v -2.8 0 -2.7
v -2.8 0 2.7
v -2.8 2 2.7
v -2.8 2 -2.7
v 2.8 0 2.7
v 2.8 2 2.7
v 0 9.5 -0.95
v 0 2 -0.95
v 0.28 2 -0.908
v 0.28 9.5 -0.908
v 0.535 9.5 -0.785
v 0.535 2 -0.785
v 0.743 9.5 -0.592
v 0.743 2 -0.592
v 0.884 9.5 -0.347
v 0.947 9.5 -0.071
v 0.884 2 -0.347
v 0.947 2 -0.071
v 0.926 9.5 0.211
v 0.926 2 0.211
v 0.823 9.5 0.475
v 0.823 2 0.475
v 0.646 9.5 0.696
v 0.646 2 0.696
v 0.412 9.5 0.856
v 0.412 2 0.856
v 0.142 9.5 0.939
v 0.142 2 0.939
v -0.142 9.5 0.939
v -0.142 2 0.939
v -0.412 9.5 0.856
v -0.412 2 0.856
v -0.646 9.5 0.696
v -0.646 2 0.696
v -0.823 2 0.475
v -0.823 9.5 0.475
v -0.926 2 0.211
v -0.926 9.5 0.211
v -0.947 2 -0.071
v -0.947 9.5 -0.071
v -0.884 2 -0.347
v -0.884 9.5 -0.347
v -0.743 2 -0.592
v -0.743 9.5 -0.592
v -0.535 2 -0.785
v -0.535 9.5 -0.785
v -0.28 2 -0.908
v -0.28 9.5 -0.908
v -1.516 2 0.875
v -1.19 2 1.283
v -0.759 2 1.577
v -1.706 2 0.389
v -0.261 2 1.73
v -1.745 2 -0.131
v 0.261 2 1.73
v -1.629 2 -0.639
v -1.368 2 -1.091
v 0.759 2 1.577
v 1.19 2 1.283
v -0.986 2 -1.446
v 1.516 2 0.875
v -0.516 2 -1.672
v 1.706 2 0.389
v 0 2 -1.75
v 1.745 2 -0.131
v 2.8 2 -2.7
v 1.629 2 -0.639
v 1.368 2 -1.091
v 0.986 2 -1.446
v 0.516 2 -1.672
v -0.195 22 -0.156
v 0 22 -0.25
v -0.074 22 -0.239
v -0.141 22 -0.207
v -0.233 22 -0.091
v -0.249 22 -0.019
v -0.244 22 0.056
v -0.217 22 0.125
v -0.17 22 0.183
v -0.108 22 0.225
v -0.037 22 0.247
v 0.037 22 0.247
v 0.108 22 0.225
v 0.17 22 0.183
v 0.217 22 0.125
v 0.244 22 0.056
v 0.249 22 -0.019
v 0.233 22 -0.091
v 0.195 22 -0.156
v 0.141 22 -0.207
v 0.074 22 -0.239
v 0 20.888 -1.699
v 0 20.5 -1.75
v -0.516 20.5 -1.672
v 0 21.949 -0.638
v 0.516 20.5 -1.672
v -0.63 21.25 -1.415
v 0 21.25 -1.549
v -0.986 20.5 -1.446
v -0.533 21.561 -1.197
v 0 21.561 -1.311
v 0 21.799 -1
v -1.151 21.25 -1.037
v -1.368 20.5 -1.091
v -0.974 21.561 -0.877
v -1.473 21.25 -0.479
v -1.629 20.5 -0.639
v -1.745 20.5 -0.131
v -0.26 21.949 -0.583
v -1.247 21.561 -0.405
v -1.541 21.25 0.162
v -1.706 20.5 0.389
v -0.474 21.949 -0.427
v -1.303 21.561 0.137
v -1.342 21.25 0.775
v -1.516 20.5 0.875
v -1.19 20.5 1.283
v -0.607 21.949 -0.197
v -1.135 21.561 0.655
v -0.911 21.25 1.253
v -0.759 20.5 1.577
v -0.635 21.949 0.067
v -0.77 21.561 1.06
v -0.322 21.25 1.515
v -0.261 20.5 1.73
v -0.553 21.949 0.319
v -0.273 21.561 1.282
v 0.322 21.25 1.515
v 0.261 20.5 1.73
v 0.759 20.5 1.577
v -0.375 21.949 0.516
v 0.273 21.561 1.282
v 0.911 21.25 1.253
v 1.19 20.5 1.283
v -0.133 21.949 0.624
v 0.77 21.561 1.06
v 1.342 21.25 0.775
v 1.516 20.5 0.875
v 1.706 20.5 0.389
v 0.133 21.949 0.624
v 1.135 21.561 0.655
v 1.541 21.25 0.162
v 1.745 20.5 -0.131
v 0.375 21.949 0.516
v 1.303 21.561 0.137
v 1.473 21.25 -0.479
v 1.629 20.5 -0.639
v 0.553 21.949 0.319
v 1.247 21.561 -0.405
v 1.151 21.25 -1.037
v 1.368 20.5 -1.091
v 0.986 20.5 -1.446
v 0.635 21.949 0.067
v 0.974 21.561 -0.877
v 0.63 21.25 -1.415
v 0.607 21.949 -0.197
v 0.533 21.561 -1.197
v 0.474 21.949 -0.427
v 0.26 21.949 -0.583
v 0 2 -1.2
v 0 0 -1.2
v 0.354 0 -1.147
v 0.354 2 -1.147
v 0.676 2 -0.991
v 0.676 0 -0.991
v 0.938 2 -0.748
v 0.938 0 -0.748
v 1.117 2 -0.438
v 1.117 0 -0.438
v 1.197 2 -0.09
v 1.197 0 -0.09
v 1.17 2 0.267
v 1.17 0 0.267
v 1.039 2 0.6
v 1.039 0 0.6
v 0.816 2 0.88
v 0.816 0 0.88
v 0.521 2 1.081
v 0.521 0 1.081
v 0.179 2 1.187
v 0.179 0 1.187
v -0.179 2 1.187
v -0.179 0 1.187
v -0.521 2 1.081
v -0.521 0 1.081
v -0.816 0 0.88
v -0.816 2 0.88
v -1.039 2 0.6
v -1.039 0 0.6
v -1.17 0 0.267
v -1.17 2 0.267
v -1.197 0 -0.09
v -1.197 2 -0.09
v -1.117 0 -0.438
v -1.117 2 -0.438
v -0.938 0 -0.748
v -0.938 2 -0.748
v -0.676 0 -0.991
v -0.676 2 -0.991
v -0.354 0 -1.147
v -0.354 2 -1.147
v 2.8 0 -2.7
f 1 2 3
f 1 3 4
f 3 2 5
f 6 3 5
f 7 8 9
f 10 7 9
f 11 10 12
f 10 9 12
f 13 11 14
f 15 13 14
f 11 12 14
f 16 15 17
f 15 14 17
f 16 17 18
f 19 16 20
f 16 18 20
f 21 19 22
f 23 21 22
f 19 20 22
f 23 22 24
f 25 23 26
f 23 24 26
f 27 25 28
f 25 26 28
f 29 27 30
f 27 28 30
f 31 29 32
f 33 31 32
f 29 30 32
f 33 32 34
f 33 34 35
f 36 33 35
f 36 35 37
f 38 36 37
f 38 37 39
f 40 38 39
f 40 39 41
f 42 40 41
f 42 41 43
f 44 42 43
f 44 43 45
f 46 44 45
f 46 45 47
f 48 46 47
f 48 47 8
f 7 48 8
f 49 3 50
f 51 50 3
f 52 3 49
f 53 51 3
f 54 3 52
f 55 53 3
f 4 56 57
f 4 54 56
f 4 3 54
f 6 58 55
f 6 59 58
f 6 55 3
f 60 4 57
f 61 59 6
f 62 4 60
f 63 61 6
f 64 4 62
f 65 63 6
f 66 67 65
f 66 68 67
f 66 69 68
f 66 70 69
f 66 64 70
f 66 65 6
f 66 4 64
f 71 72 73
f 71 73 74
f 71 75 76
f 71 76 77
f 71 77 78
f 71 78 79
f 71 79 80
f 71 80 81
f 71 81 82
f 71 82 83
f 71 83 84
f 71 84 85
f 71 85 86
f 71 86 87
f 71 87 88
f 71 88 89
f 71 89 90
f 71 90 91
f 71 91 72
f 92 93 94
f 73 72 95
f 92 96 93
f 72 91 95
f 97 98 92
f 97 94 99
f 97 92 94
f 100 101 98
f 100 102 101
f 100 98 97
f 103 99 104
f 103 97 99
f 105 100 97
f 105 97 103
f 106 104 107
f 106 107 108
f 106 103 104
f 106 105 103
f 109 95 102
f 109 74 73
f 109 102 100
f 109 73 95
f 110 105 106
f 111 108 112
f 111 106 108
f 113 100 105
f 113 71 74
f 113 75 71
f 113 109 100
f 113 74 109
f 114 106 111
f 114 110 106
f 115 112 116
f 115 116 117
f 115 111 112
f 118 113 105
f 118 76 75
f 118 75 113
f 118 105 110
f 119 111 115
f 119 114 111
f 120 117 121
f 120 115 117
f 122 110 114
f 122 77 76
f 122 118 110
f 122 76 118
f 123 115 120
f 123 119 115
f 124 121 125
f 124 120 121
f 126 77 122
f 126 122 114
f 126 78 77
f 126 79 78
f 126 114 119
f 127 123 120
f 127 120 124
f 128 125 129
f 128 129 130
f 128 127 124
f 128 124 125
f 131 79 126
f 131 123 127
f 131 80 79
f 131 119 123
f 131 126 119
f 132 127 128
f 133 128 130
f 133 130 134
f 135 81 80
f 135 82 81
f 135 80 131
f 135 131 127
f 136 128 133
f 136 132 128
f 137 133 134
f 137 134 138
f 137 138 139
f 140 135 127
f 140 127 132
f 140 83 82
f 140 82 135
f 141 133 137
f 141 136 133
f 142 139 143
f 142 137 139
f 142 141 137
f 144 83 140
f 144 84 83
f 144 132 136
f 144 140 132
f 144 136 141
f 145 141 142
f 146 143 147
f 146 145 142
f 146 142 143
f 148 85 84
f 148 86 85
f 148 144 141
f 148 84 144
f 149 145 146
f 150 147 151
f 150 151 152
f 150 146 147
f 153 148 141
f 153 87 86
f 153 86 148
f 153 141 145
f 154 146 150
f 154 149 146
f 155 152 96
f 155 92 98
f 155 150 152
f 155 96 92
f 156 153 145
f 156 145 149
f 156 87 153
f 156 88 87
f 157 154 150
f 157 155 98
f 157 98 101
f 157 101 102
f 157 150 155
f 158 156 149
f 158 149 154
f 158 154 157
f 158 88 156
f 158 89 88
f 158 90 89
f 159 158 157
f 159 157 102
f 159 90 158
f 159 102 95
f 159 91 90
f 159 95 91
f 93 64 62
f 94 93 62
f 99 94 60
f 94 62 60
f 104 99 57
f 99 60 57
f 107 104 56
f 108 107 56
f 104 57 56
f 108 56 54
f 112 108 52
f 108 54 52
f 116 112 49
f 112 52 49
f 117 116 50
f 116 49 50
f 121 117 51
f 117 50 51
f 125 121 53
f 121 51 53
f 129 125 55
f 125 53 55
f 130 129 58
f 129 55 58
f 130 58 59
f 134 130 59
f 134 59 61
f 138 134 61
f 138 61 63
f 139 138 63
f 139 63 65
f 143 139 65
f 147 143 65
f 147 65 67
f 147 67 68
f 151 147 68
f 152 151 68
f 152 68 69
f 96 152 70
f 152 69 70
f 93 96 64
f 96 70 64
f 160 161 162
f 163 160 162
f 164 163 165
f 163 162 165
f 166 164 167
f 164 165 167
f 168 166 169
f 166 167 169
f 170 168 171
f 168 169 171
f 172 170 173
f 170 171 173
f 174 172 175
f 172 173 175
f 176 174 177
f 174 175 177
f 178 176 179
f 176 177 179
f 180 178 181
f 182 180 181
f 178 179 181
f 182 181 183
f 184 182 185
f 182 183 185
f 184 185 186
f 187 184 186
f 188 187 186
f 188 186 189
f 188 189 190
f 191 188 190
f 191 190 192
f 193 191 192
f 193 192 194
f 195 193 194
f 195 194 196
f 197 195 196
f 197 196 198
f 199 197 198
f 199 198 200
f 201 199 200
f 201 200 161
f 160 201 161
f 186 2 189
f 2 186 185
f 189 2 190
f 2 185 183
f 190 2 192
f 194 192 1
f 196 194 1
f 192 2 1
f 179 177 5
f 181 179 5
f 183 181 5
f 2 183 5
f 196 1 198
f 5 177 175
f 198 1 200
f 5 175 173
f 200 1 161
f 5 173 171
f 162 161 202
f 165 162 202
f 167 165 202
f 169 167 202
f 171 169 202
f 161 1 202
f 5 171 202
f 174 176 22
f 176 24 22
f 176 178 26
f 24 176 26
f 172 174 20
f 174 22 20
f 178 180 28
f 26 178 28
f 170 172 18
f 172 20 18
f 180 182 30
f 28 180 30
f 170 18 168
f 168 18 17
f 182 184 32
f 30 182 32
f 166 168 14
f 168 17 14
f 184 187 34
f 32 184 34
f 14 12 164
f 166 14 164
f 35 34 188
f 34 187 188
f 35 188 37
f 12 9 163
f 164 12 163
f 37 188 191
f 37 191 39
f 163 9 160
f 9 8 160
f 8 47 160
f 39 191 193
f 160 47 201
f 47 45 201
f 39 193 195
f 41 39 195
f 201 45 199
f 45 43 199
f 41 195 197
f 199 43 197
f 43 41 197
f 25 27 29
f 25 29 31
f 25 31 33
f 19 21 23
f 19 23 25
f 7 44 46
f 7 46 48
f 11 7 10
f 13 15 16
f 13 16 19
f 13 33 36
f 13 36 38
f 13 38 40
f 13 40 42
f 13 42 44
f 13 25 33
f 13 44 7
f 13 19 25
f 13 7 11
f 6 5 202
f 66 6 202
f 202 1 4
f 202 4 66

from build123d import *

# Parameters (mm, degrees)
SKETCH1_W           = 5.6
SKETCH1_H           = 5.4
BOSS_EXTRUDE1_DEPTH = 2
SKETCH3_R           = 0.95
CUT_EXTRUDE2_DEPTH  = 9.5
SKETCH7_R           = 1.2
CUT_EXTRUDE4_DEPTH  = 2.8
SKETCH2_R           = 1.75
BOSS_EXTRUDE2_DEPTH = 20
FILLET2_R           = 1.5
SKETCH8_R           = 0.95
CUT_EXTRUDE5_DEPTH  = 9.5


with BuildPart() as part:
    # Sketch1 → Boss-Extrude1 (new body)
    with BuildSketch(Plane(origin=(0, 0, 0), x_dir=(1, 0, 0), z_dir=(0, 1, 0))):
        Rectangle(SKETCH1_W, SKETCH1_H)
    extrude(amount=BOSS_EXTRUDE1_DEPTH)

    # Sketch3 → Cut-Extrude2 (cut)
    with BuildSketch(Plane.XZ):
        with Locations(Location((0, 0, 0), (0, 0, 270))):
            Circle(SKETCH3_R)
    extrude(amount=-CUT_EXTRUDE2_DEPTH, mode=Mode.SUBTRACT)

    # Sketch7 → Cut-Extrude4 (cut)
    with BuildSketch(Plane.XZ):
        with Locations(Location((0, 0, 0), (0, 0, 270))):
            Circle(SKETCH7_R)
    extrude(amount=-CUT_EXTRUDE4_DEPTH, mode=Mode.SUBTRACT)

    # Sketch2 → Boss-Extrude2 (add)
    with BuildSketch(Plane(origin=(0, 2, 0), x_dir=(1, 0, 0), z_dir=(0, 1, 0))):
        with Locations(Location((0, 0, 0), (0, 0, 90))):
            Circle(SKETCH2_R)
    extrude(amount=BOSS_EXTRUDE2_DEPTH)

    # Fillet2
    fillet2_edges = [part.edges().sort_by_distance(p)[0] for p in [
        (0, 22, 1.75),
    ]]
    fillet(fillet2_edges, radius=FILLET2_R)

    # Sketch8 → Cut-Extrude5 (cut)
    with BuildSketch(Plane.XZ):
        with Locations(Location((0, 0, 0), (0, 0, 270))):
            Circle(SKETCH8_R)
    extrude(amount=-CUT_EXTRUDE5_DEPTH, mode=Mode.SUBTRACT)


solid = part.part
